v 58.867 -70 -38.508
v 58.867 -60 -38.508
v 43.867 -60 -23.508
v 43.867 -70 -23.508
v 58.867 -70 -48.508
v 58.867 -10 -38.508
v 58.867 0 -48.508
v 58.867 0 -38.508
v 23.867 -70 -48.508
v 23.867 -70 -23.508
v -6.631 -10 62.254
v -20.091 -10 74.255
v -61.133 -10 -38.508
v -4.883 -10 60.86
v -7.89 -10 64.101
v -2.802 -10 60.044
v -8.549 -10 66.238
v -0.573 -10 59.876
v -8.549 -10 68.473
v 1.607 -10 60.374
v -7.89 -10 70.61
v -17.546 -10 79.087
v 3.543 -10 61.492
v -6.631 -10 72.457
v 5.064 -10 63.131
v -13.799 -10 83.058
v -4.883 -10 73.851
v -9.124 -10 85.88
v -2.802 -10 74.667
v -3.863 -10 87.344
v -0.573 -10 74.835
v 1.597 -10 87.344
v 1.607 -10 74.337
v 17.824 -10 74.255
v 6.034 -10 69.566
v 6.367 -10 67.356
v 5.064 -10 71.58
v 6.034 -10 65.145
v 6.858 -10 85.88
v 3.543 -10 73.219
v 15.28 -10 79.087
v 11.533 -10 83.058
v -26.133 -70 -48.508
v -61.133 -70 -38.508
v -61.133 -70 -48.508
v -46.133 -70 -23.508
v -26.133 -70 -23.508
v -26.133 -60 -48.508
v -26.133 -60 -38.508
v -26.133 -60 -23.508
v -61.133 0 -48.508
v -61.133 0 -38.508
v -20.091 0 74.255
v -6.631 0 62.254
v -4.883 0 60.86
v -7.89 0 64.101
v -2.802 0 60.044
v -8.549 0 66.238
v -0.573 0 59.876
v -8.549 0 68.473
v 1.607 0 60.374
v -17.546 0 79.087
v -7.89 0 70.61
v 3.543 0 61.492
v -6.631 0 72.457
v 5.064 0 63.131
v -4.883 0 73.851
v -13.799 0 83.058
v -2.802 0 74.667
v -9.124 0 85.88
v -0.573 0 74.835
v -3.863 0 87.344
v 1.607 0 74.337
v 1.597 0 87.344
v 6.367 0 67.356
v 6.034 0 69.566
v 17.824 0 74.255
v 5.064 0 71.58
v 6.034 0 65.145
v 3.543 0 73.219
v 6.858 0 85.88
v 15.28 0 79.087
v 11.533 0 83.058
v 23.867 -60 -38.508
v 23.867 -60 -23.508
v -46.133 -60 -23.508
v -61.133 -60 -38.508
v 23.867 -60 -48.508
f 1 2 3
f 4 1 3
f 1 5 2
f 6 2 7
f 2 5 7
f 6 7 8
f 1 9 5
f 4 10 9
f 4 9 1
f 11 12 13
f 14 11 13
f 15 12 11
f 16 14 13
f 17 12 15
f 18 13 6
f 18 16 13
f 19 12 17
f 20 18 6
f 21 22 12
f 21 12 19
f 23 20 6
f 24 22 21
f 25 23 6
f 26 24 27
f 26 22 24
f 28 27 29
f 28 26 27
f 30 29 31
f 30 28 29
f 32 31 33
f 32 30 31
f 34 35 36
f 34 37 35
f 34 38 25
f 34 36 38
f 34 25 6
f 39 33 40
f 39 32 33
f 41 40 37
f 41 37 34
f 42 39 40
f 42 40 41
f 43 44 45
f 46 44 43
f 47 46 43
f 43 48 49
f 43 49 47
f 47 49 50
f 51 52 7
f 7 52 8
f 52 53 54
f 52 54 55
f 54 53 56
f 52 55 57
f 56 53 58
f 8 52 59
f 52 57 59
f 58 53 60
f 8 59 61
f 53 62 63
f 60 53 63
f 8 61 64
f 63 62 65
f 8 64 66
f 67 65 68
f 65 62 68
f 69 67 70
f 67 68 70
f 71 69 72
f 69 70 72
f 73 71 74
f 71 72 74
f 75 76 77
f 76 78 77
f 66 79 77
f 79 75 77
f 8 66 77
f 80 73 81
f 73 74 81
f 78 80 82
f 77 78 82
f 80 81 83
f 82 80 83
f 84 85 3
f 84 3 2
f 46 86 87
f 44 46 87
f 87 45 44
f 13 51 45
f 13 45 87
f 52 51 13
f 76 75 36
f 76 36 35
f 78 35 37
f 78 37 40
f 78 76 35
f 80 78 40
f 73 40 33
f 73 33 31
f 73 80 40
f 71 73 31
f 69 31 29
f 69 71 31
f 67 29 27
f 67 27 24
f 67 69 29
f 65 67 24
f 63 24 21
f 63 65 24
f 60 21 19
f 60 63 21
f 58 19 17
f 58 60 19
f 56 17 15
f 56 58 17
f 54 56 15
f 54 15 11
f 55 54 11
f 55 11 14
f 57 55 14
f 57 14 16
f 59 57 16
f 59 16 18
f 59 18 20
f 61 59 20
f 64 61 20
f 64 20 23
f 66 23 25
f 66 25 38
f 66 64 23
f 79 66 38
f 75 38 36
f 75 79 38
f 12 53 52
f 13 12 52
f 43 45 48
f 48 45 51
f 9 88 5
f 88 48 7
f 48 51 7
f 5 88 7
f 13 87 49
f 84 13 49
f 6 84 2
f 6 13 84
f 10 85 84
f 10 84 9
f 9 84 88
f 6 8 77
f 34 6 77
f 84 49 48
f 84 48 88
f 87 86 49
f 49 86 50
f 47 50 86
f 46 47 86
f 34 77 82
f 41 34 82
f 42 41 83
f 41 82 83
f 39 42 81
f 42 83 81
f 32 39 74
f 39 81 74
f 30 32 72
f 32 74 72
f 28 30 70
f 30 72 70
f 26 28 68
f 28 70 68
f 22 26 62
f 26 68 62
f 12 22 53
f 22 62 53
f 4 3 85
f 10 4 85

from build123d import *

# Parameters (mm, degrees)
F0_R     = 7.5
F0_W     = 120
F0_H     = 10
F1_DEPTH = 10
F2_W     = 120
F2_H     = 10
F3_DEPTH = 50
F4_W     = 35
F4_H     = 10
F5_DEPTH = 10


with BuildPart() as f1:
    # F0 (on Front) → F1 (new body)
    with BuildSketch(Plane.XZ):
        with BuildLine():
            Line((-20.090676, 74.255499), (-61.133094, -38.507616))
            Line((-61.133094, -38.507616), (58.866906, -38.507616))
            Line((58.866906, -38.507616), (17.824489, 74.255499))
            ThreePointArc((17.824489, 74.255499), (-1.133094, 87.529741), (-20.090676, 74.255499))
        make_face()
        with Locations((-1.133094, 67.355503)):
            Circle(F0_R, mode=Mode.SUBTRACT)
        with Locations((-1.133094, -43.507616)):
            Rectangle(F0_W, F0_H)
    extrude(amount=F1_DEPTH)

    # F2 (on face) → F3 (join)
    with BuildSketch(Plane.XZ.offset(10)):
        with Locations((-1.133094, -43.507616)):
            Rectangle(F2_W, F2_H)
    extrude(amount=F3_DEPTH)

    # F4 (on face) → F5 (join)
    with BuildSketch(Plane.XZ.offset(60)):
        Polygon((23.866906, -23.507616), (23.866906, -38.507616), (58.866906, -38.507616), (43.866906, -23.507616), align=None)
        with Locations((-43.633094, -43.507616)):
            Rectangle(F4_W, F4_H)
        with Locations((41.366906, -43.507616)):
            Rectangle(F4_W, F4_H)
        Polygon((-46.133094, -23.507616), (-61.133094, -38.507616), (-26.133094, -38.507616), (-26.133094, -23.507616), align=None)
    extrude(amount=F5_DEPTH)


solid = f1.part
